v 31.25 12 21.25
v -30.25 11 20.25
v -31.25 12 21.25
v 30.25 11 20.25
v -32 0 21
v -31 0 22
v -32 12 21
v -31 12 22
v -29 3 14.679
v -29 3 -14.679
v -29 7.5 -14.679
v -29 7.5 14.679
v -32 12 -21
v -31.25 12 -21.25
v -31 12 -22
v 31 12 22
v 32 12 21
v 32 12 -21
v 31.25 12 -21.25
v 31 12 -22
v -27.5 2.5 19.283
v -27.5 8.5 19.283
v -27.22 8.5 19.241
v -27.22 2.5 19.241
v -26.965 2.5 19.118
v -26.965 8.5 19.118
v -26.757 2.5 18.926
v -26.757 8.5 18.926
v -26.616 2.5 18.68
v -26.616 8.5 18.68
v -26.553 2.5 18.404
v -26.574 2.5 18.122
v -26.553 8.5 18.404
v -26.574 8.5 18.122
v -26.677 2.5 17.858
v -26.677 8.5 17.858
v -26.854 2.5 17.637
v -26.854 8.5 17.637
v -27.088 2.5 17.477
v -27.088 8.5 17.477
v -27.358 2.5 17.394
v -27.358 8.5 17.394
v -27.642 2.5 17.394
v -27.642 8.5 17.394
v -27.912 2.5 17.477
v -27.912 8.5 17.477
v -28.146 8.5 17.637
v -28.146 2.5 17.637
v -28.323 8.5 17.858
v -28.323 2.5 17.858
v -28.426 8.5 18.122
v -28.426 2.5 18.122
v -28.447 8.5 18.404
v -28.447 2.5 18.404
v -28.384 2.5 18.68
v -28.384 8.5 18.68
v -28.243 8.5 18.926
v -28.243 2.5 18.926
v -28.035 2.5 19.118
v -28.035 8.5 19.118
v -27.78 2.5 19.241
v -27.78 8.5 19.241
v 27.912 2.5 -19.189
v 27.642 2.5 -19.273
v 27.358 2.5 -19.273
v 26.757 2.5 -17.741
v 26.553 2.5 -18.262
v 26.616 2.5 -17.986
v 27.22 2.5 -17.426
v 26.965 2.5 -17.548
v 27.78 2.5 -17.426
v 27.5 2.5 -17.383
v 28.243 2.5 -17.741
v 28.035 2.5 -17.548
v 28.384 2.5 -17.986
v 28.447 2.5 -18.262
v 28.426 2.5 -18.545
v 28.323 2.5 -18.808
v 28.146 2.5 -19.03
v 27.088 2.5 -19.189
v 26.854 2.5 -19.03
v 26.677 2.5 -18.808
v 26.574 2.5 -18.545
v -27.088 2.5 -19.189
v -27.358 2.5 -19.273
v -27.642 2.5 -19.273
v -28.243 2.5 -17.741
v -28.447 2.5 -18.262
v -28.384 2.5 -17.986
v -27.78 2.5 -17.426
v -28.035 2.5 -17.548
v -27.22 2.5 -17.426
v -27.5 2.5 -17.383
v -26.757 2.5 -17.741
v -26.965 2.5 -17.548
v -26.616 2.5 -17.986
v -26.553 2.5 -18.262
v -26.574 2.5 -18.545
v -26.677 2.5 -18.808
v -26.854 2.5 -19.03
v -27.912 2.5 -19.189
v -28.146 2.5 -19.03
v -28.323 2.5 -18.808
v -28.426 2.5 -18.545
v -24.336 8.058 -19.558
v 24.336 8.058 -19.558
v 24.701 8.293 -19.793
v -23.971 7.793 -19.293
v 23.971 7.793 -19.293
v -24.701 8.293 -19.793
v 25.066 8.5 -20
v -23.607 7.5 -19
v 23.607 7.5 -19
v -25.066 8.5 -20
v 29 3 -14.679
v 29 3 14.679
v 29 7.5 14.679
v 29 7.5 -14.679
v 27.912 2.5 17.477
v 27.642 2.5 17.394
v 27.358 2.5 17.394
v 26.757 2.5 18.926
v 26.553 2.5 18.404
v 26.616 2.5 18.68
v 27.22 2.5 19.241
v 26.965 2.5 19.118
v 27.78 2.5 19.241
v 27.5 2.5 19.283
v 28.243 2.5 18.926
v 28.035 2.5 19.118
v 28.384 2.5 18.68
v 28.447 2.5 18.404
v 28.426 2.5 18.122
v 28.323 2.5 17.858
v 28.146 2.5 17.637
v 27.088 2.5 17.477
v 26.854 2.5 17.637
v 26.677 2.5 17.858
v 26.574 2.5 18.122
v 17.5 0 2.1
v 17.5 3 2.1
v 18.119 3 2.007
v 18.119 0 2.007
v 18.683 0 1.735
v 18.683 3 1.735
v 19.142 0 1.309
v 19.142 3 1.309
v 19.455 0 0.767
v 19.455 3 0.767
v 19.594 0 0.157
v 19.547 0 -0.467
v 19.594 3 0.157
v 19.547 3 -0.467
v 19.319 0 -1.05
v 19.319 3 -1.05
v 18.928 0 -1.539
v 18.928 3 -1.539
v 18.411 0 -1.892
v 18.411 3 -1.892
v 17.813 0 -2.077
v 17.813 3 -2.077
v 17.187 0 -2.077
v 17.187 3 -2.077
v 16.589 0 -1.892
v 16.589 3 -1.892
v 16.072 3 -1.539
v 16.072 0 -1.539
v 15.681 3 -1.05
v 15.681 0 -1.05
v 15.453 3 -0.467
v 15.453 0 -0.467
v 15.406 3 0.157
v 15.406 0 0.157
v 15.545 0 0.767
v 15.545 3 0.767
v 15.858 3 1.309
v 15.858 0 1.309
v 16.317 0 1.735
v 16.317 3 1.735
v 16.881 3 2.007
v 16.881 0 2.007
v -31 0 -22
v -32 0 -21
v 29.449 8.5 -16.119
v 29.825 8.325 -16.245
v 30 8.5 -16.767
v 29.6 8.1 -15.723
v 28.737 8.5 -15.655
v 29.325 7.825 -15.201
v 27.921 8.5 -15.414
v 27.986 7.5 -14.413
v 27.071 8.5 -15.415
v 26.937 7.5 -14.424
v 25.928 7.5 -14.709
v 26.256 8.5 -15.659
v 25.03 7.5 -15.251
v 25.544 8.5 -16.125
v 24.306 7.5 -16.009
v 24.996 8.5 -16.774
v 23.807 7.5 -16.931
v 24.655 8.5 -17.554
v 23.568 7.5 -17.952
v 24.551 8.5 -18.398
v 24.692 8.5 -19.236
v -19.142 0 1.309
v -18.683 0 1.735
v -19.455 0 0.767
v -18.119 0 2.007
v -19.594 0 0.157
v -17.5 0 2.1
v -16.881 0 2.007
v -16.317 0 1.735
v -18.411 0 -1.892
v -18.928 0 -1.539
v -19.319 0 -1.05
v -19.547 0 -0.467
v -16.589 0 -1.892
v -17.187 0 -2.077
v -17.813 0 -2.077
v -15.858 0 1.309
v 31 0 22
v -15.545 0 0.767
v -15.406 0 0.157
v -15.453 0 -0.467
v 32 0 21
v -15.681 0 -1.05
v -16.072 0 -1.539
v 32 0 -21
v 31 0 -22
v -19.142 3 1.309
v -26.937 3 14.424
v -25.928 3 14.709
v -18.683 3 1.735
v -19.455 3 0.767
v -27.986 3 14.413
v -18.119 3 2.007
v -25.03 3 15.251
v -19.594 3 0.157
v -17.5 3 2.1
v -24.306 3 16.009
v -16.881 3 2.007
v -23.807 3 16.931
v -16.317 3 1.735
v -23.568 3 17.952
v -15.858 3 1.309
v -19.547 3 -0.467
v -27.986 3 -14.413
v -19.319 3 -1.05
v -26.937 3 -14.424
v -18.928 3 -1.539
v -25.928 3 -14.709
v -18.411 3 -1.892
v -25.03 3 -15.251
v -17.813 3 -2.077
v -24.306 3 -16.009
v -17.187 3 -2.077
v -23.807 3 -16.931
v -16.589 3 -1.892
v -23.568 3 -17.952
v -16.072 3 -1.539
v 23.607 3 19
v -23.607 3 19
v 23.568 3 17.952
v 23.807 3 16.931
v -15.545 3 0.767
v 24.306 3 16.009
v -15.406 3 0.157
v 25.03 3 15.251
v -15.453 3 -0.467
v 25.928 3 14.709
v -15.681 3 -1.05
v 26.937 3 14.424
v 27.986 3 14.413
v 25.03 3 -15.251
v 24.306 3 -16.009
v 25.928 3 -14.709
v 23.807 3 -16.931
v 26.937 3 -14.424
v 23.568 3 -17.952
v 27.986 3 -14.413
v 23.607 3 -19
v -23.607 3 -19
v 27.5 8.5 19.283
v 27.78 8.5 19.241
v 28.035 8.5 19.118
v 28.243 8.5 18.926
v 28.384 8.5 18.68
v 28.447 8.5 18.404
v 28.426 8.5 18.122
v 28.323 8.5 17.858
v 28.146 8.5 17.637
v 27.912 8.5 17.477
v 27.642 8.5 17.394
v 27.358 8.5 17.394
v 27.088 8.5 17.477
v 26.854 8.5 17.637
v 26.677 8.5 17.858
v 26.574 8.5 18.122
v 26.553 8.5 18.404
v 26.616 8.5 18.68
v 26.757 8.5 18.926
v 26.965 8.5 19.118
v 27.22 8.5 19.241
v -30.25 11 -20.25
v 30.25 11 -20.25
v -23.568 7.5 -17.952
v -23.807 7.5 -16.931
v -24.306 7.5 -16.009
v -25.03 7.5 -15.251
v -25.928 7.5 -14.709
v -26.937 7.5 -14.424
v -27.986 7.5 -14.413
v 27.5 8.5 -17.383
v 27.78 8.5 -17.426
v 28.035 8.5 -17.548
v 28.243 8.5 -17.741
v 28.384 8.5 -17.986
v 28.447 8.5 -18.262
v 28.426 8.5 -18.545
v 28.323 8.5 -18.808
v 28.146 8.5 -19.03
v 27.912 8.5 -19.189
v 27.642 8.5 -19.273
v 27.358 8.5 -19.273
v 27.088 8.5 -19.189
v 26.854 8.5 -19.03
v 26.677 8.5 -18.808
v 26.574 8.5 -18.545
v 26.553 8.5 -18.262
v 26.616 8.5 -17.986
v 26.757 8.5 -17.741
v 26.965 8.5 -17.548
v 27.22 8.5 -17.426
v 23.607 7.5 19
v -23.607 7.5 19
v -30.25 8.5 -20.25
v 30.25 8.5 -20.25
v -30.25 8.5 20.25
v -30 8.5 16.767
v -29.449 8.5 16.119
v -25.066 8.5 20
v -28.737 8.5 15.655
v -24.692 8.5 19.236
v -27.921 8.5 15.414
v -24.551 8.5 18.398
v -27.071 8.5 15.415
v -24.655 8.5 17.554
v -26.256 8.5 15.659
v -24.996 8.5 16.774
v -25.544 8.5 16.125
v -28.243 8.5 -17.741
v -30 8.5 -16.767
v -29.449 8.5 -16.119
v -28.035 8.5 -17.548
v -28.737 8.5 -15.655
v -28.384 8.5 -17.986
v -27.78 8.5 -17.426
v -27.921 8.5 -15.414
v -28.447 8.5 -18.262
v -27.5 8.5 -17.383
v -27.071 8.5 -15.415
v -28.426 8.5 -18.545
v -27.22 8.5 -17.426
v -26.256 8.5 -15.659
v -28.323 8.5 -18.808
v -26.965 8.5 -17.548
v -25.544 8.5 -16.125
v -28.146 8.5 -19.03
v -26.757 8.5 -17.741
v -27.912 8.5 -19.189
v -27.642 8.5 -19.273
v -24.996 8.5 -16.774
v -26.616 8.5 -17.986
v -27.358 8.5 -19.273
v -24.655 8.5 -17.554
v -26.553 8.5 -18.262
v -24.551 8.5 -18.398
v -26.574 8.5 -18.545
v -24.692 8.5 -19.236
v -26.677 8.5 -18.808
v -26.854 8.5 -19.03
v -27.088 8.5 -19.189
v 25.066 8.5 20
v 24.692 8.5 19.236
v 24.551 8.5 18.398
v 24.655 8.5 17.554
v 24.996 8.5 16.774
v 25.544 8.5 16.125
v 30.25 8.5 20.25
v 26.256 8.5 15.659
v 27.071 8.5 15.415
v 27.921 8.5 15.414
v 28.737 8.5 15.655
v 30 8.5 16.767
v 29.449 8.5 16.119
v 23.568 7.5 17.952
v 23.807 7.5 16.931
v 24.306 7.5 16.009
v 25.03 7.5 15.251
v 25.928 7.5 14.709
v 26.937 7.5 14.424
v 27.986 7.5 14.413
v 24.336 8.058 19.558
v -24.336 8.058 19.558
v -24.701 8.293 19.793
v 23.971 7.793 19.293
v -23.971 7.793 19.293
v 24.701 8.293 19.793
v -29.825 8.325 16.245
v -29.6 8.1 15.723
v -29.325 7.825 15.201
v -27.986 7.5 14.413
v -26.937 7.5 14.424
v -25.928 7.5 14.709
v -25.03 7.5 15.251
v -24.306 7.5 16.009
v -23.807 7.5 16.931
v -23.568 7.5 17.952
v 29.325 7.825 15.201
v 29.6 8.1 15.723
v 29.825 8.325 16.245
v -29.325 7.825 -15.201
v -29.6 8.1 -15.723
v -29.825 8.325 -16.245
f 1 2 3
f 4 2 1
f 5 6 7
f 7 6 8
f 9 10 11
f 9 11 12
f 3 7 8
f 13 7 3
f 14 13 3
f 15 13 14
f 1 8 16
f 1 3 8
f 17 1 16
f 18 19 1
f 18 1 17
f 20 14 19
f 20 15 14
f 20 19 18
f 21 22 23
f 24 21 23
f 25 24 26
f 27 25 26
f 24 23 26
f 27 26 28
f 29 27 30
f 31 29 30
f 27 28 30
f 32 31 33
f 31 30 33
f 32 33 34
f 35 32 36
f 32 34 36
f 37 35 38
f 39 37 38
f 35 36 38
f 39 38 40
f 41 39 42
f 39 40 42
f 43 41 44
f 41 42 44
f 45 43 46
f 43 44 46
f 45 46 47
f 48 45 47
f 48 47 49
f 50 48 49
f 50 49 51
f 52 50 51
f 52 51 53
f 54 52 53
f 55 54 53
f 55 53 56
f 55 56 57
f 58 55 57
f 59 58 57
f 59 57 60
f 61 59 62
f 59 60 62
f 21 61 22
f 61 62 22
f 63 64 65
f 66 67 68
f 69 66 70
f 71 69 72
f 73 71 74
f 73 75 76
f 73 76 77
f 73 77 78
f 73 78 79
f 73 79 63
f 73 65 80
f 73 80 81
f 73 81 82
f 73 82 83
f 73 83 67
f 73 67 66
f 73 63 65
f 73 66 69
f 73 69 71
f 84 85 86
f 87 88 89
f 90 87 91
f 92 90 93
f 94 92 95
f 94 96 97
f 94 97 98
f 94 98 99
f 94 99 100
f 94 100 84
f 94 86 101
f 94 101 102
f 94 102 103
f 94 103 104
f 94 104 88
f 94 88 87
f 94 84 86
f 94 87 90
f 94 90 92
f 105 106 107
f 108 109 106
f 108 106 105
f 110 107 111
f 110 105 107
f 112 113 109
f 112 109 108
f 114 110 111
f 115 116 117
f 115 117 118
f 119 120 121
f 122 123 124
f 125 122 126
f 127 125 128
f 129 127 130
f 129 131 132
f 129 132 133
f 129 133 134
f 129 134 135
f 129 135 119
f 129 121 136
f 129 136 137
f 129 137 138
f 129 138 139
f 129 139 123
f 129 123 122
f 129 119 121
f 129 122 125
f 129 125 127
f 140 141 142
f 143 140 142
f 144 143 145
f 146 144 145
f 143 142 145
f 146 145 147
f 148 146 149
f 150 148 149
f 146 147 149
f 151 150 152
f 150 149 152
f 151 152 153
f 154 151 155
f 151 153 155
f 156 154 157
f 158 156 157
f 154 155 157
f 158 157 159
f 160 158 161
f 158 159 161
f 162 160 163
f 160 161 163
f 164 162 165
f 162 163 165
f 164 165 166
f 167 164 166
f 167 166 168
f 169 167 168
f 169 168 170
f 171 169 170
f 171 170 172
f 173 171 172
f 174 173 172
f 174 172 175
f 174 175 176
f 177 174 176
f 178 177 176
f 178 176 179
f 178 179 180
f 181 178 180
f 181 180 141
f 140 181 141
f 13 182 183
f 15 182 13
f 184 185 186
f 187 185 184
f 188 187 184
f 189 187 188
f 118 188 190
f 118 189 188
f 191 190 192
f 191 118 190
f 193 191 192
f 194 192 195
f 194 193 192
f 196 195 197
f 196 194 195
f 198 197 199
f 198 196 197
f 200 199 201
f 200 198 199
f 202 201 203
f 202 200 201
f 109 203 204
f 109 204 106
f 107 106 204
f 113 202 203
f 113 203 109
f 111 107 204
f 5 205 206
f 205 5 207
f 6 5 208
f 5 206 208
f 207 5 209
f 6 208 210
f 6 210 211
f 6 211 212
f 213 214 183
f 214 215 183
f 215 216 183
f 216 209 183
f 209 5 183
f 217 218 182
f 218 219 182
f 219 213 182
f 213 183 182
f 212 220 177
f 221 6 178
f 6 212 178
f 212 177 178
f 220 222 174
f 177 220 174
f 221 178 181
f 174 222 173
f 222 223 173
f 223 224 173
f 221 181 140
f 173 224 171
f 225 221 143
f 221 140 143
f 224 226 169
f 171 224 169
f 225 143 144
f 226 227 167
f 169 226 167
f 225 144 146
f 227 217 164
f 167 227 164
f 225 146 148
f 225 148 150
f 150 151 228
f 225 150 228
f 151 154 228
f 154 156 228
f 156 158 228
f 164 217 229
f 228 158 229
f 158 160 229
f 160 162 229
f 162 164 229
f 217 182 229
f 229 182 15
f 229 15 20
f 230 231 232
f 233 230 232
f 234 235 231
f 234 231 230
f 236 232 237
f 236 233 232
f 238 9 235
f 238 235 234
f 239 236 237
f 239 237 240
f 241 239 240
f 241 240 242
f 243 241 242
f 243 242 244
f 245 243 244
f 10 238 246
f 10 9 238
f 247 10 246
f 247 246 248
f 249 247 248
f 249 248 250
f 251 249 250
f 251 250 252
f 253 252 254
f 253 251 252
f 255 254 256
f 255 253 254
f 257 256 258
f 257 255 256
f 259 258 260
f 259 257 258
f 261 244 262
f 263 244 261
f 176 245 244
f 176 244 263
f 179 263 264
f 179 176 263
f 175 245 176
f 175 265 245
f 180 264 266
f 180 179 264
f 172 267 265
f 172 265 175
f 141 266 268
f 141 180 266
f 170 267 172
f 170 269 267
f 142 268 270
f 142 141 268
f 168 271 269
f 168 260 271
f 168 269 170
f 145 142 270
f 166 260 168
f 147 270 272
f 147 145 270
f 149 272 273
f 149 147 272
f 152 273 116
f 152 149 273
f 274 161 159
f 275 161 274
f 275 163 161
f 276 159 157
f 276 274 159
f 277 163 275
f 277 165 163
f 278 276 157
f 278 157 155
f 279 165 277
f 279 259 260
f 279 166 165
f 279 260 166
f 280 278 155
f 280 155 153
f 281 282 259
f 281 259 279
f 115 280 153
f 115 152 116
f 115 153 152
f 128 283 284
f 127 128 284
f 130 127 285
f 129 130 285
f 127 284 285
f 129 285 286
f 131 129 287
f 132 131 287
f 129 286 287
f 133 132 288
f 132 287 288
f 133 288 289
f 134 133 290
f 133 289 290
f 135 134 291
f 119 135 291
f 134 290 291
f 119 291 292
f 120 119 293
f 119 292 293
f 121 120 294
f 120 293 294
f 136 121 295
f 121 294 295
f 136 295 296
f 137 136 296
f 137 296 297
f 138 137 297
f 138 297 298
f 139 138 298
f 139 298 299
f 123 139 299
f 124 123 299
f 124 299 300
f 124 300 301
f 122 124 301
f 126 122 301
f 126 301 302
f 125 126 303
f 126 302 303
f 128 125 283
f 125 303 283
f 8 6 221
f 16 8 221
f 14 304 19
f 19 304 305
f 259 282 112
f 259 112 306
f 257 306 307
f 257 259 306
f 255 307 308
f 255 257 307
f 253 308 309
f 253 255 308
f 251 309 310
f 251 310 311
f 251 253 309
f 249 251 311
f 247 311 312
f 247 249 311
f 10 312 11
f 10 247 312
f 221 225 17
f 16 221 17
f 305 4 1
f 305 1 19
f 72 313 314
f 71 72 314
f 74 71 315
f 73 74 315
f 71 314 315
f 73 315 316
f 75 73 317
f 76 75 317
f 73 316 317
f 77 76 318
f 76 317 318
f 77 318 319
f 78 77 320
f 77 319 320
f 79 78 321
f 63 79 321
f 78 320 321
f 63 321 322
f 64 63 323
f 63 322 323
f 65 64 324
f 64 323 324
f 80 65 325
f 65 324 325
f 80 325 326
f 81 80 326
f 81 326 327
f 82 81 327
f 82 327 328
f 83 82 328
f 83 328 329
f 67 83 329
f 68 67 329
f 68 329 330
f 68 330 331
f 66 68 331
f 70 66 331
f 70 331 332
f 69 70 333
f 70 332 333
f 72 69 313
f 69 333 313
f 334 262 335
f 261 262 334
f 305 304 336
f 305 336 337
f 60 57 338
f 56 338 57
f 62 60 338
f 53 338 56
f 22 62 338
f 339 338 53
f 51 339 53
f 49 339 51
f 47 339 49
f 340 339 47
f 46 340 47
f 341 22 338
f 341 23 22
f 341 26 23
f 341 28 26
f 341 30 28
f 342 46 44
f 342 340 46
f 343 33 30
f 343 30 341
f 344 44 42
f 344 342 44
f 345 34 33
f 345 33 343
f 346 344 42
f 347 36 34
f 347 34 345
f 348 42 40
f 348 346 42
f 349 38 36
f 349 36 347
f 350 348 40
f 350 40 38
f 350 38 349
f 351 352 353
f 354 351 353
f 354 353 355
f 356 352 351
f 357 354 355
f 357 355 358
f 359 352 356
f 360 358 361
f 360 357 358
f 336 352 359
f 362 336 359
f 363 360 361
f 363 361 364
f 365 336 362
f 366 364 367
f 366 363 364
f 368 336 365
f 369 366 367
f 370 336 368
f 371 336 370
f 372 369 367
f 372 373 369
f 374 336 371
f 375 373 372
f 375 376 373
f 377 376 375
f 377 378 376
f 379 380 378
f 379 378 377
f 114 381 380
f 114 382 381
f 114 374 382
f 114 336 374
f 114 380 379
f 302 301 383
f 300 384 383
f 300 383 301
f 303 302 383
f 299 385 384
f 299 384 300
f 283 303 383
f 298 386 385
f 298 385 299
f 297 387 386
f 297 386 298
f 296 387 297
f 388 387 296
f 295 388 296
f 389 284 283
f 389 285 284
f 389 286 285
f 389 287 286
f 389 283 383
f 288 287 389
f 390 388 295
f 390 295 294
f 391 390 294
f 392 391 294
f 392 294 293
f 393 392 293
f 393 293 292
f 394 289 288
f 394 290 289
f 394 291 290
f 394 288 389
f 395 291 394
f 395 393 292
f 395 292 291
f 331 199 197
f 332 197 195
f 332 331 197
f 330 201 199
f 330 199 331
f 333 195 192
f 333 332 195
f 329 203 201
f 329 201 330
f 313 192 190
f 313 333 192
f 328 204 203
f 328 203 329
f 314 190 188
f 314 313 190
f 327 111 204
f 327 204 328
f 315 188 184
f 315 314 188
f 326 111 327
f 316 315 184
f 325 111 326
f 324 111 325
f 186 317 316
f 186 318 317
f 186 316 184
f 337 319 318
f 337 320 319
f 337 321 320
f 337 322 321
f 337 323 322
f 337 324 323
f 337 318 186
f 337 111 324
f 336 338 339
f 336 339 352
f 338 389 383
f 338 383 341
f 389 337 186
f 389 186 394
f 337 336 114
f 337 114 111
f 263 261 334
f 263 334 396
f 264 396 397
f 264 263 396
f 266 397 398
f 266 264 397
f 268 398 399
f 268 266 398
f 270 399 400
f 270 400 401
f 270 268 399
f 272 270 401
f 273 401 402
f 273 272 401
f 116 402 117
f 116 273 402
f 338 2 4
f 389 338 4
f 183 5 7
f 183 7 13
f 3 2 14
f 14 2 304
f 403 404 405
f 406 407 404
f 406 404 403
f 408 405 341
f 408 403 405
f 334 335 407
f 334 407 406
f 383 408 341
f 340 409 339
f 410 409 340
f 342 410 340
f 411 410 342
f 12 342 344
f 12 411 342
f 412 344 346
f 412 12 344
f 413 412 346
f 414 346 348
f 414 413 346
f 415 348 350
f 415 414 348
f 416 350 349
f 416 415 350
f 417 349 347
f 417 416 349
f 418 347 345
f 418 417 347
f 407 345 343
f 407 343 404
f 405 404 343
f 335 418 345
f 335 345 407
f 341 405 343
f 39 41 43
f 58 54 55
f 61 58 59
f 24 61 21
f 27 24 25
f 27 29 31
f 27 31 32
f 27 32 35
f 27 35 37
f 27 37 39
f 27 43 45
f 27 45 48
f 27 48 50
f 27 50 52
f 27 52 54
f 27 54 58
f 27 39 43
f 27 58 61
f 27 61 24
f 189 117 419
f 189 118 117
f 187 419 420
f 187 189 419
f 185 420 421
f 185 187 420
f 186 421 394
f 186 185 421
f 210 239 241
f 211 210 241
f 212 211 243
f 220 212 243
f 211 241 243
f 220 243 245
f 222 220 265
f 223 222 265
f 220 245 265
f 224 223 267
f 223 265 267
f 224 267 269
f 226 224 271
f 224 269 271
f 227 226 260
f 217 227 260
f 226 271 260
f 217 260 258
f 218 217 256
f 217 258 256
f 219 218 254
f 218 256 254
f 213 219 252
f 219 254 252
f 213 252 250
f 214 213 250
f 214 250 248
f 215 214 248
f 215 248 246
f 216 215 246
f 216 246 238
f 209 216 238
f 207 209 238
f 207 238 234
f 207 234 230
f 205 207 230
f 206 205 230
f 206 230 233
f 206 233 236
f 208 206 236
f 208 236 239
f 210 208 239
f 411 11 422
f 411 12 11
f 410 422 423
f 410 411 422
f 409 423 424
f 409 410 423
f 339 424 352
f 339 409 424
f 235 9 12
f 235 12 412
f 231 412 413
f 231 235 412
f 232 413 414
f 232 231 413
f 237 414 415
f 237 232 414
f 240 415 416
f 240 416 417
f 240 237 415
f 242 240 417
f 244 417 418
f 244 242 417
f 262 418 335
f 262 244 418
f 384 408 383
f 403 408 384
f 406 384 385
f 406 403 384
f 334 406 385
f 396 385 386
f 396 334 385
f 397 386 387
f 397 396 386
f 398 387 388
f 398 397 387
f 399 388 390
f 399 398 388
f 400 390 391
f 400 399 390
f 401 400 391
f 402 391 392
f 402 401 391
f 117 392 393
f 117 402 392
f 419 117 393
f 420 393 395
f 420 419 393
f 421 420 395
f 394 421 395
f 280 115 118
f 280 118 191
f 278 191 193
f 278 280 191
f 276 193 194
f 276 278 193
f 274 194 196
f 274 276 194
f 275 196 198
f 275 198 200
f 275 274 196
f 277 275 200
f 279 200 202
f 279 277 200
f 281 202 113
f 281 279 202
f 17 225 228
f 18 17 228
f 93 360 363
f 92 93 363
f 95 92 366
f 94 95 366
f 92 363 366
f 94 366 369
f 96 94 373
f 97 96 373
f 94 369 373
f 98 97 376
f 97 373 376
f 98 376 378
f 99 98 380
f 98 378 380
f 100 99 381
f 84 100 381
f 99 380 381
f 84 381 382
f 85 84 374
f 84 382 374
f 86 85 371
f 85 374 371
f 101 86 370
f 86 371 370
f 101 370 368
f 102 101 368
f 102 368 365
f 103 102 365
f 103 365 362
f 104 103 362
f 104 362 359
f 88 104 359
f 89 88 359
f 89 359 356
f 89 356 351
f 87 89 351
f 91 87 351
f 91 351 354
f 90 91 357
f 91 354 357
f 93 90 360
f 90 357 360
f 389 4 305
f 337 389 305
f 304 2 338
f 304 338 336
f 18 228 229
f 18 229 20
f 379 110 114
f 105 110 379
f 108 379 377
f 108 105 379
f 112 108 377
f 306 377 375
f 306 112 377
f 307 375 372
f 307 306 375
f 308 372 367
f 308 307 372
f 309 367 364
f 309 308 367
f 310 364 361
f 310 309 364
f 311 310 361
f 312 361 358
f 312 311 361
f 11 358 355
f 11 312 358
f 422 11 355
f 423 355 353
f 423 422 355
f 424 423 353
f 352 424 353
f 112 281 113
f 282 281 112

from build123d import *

# Parameters (mm, degrees)
SKETCH1_W           = 64
SKETCH1_H           = 44
BOSS_EXTRUDE1_DEPTH = 12
SKETCH2_W           = 60.5
SKETCH2_H           = 40.5
CUT_EXTRUDE1_DEPTH  = 3.5
SKETCH3_R           = 0.95
CUT_EXTRUDE2_DEPTH  = 6
SHELL1_START        = 3
SHELL1_DEPTH        = 5.5
CHAMFER1_SIZE       = 1
CHAMFER2_SIZE       = 1
CHAMFER3_SIZE       = 1
SKETCH4_R           = 2.1
CUT_EXTRUDE3_DEPTH  = 40.862262856


# Read off the part's stored shape, not the designer's step: Shell1
with BuildPart() as part:
    # Sketch1 → Boss-Extrude1 (new body)
    with BuildSketch(Plane(origin=(0, 0, 0), x_dir=(1, 0, 0), z_dir=(0, 1, 0))):
        Rectangle(SKETCH1_W, SKETCH1_H)
    extrude(amount=BOSS_EXTRUDE1_DEPTH)

    # Sketch2 → Cut-Extrude1 (cut)
    with BuildSketch(Plane(origin=(0, 12, 0), x_dir=(1, 0, 0), z_dir=(0, 1, 0))):
        Rectangle(SKETCH2_W, SKETCH2_H)
    extrude(amount=-CUT_EXTRUDE1_DEPTH, mode=Mode.SUBTRACT)

    # Sketch3 → Cut-Extrude2 (cut)
    with BuildSketch(Plane(origin=(0, 8.5, 0), x_dir=(1, 0, 0), z_dir=(0, 1, 0))):
        with Locations(Location((-27.5, 18.333333333, 0), (0, 0, 270))):
            Circle(SKETCH3_R)
        with Locations(Location((27.5, 18.333333333, 0), (0, 0, 270))):
            Circle(SKETCH3_R)
        with Locations(Location((27.5, -18.333333333, 0), (0, 0, 270))):
            Circle(SKETCH3_R)
        with Locations(Location((-27.5, -18.333333333, 0), (0, 0, 270))):
            Circle(SKETCH3_R)
    extrude(amount=-CUT_EXTRUDE2_DEPTH, mode=Mode.SUBTRACT)

    # Shell1 outline → Shell1 (cut)
    with BuildSketch(Plane(origin=(0, 0, 0), x_dir=(1, 0, 0), z_dir=(0, 1, 0)).offset(SHELL1_START)):
        with BuildLine():
            Line((-23.60666524, -19), (23.60666524, -19))
            ThreePointArc((23.60666524, -19), (25.030327008, -15.250604784), (29, -14.679226055))
            Line((29, -14.679226055), (29, 14.679226055))
            ThreePointArc((29, 14.679226055), (25.030327008, 15.250604784), (23.60666524, 19))
            Line((23.60666524, 19), (-23.60666524, 19))
            ThreePointArc((-23.60666524, 19), (-25.030327008, 15.250604784), (-29, 14.679226055))
            Line((-29, 14.679226055), (-29, -14.679226055))
            ThreePointArc((-29, -14.679226055), (-25.030327008, -15.250604784), (-23.60666524, -19))
        make_face()
    extrude(amount=SHELL1_DEPTH, mode=Mode.SUBTRACT)

    # Chamfer1
    chamfer1_edges = [part.edges().sort_by_distance(p)[0] for p in [
        (30.25, 12, 0),
        (0, 12, -20.25),
        (-30.25, 12, 0),
        (0, 12, 20.25),
    ]]
    chamfer(chamfer1_edges, length=CHAMFER1_SIZE)

    # Chamfer2
    chamfer2_edges = [part.edges().sort_by_distance(p)[0] for p in [
        (0, 8.5, 19),
        (29, 8.5, 0),
        (0, 8.5, -19),
        (-29, 8.5, 0),
        (-25.030327008, 8.5, -15.250604784),
        (25.030327008, 8.5, -15.250604784),
        (25.030327008, 8.5, 15.250604784),
        (-25.030327008, 8.5, 15.250604784),
    ]]
    chamfer(chamfer2_edges, length=CHAMFER2_SIZE)

    # Chamfer3
    chamfer3_edges = [part.edges().sort_by_distance(p)[0] for p in [
        (-32, 6, 22),
        (-32, 6, -22),
        (32, 6, -22),
        (32, 6, 22),
    ]]
    chamfer(chamfer3_edges, length=CHAMFER3_SIZE)

    # Sketch4 → Cut-Extrude3 (cut, through all)
    with BuildSketch(Plane(origin=(0, 3, 0), x_dir=(1, 0, 0), z_dir=(0, 1, 0))):
        with Locations(Location((-17.5, 0, 0), (0, 0, 270))):
            Circle(SKETCH4_R)
        with Locations(Location((17.5, 0, 0), (0, 0, 270))):
            Circle(SKETCH4_R)
    extrude(amount=-CUT_EXTRUDE3_DEPTH, mode=Mode.SUBTRACT)


solid = part.part
